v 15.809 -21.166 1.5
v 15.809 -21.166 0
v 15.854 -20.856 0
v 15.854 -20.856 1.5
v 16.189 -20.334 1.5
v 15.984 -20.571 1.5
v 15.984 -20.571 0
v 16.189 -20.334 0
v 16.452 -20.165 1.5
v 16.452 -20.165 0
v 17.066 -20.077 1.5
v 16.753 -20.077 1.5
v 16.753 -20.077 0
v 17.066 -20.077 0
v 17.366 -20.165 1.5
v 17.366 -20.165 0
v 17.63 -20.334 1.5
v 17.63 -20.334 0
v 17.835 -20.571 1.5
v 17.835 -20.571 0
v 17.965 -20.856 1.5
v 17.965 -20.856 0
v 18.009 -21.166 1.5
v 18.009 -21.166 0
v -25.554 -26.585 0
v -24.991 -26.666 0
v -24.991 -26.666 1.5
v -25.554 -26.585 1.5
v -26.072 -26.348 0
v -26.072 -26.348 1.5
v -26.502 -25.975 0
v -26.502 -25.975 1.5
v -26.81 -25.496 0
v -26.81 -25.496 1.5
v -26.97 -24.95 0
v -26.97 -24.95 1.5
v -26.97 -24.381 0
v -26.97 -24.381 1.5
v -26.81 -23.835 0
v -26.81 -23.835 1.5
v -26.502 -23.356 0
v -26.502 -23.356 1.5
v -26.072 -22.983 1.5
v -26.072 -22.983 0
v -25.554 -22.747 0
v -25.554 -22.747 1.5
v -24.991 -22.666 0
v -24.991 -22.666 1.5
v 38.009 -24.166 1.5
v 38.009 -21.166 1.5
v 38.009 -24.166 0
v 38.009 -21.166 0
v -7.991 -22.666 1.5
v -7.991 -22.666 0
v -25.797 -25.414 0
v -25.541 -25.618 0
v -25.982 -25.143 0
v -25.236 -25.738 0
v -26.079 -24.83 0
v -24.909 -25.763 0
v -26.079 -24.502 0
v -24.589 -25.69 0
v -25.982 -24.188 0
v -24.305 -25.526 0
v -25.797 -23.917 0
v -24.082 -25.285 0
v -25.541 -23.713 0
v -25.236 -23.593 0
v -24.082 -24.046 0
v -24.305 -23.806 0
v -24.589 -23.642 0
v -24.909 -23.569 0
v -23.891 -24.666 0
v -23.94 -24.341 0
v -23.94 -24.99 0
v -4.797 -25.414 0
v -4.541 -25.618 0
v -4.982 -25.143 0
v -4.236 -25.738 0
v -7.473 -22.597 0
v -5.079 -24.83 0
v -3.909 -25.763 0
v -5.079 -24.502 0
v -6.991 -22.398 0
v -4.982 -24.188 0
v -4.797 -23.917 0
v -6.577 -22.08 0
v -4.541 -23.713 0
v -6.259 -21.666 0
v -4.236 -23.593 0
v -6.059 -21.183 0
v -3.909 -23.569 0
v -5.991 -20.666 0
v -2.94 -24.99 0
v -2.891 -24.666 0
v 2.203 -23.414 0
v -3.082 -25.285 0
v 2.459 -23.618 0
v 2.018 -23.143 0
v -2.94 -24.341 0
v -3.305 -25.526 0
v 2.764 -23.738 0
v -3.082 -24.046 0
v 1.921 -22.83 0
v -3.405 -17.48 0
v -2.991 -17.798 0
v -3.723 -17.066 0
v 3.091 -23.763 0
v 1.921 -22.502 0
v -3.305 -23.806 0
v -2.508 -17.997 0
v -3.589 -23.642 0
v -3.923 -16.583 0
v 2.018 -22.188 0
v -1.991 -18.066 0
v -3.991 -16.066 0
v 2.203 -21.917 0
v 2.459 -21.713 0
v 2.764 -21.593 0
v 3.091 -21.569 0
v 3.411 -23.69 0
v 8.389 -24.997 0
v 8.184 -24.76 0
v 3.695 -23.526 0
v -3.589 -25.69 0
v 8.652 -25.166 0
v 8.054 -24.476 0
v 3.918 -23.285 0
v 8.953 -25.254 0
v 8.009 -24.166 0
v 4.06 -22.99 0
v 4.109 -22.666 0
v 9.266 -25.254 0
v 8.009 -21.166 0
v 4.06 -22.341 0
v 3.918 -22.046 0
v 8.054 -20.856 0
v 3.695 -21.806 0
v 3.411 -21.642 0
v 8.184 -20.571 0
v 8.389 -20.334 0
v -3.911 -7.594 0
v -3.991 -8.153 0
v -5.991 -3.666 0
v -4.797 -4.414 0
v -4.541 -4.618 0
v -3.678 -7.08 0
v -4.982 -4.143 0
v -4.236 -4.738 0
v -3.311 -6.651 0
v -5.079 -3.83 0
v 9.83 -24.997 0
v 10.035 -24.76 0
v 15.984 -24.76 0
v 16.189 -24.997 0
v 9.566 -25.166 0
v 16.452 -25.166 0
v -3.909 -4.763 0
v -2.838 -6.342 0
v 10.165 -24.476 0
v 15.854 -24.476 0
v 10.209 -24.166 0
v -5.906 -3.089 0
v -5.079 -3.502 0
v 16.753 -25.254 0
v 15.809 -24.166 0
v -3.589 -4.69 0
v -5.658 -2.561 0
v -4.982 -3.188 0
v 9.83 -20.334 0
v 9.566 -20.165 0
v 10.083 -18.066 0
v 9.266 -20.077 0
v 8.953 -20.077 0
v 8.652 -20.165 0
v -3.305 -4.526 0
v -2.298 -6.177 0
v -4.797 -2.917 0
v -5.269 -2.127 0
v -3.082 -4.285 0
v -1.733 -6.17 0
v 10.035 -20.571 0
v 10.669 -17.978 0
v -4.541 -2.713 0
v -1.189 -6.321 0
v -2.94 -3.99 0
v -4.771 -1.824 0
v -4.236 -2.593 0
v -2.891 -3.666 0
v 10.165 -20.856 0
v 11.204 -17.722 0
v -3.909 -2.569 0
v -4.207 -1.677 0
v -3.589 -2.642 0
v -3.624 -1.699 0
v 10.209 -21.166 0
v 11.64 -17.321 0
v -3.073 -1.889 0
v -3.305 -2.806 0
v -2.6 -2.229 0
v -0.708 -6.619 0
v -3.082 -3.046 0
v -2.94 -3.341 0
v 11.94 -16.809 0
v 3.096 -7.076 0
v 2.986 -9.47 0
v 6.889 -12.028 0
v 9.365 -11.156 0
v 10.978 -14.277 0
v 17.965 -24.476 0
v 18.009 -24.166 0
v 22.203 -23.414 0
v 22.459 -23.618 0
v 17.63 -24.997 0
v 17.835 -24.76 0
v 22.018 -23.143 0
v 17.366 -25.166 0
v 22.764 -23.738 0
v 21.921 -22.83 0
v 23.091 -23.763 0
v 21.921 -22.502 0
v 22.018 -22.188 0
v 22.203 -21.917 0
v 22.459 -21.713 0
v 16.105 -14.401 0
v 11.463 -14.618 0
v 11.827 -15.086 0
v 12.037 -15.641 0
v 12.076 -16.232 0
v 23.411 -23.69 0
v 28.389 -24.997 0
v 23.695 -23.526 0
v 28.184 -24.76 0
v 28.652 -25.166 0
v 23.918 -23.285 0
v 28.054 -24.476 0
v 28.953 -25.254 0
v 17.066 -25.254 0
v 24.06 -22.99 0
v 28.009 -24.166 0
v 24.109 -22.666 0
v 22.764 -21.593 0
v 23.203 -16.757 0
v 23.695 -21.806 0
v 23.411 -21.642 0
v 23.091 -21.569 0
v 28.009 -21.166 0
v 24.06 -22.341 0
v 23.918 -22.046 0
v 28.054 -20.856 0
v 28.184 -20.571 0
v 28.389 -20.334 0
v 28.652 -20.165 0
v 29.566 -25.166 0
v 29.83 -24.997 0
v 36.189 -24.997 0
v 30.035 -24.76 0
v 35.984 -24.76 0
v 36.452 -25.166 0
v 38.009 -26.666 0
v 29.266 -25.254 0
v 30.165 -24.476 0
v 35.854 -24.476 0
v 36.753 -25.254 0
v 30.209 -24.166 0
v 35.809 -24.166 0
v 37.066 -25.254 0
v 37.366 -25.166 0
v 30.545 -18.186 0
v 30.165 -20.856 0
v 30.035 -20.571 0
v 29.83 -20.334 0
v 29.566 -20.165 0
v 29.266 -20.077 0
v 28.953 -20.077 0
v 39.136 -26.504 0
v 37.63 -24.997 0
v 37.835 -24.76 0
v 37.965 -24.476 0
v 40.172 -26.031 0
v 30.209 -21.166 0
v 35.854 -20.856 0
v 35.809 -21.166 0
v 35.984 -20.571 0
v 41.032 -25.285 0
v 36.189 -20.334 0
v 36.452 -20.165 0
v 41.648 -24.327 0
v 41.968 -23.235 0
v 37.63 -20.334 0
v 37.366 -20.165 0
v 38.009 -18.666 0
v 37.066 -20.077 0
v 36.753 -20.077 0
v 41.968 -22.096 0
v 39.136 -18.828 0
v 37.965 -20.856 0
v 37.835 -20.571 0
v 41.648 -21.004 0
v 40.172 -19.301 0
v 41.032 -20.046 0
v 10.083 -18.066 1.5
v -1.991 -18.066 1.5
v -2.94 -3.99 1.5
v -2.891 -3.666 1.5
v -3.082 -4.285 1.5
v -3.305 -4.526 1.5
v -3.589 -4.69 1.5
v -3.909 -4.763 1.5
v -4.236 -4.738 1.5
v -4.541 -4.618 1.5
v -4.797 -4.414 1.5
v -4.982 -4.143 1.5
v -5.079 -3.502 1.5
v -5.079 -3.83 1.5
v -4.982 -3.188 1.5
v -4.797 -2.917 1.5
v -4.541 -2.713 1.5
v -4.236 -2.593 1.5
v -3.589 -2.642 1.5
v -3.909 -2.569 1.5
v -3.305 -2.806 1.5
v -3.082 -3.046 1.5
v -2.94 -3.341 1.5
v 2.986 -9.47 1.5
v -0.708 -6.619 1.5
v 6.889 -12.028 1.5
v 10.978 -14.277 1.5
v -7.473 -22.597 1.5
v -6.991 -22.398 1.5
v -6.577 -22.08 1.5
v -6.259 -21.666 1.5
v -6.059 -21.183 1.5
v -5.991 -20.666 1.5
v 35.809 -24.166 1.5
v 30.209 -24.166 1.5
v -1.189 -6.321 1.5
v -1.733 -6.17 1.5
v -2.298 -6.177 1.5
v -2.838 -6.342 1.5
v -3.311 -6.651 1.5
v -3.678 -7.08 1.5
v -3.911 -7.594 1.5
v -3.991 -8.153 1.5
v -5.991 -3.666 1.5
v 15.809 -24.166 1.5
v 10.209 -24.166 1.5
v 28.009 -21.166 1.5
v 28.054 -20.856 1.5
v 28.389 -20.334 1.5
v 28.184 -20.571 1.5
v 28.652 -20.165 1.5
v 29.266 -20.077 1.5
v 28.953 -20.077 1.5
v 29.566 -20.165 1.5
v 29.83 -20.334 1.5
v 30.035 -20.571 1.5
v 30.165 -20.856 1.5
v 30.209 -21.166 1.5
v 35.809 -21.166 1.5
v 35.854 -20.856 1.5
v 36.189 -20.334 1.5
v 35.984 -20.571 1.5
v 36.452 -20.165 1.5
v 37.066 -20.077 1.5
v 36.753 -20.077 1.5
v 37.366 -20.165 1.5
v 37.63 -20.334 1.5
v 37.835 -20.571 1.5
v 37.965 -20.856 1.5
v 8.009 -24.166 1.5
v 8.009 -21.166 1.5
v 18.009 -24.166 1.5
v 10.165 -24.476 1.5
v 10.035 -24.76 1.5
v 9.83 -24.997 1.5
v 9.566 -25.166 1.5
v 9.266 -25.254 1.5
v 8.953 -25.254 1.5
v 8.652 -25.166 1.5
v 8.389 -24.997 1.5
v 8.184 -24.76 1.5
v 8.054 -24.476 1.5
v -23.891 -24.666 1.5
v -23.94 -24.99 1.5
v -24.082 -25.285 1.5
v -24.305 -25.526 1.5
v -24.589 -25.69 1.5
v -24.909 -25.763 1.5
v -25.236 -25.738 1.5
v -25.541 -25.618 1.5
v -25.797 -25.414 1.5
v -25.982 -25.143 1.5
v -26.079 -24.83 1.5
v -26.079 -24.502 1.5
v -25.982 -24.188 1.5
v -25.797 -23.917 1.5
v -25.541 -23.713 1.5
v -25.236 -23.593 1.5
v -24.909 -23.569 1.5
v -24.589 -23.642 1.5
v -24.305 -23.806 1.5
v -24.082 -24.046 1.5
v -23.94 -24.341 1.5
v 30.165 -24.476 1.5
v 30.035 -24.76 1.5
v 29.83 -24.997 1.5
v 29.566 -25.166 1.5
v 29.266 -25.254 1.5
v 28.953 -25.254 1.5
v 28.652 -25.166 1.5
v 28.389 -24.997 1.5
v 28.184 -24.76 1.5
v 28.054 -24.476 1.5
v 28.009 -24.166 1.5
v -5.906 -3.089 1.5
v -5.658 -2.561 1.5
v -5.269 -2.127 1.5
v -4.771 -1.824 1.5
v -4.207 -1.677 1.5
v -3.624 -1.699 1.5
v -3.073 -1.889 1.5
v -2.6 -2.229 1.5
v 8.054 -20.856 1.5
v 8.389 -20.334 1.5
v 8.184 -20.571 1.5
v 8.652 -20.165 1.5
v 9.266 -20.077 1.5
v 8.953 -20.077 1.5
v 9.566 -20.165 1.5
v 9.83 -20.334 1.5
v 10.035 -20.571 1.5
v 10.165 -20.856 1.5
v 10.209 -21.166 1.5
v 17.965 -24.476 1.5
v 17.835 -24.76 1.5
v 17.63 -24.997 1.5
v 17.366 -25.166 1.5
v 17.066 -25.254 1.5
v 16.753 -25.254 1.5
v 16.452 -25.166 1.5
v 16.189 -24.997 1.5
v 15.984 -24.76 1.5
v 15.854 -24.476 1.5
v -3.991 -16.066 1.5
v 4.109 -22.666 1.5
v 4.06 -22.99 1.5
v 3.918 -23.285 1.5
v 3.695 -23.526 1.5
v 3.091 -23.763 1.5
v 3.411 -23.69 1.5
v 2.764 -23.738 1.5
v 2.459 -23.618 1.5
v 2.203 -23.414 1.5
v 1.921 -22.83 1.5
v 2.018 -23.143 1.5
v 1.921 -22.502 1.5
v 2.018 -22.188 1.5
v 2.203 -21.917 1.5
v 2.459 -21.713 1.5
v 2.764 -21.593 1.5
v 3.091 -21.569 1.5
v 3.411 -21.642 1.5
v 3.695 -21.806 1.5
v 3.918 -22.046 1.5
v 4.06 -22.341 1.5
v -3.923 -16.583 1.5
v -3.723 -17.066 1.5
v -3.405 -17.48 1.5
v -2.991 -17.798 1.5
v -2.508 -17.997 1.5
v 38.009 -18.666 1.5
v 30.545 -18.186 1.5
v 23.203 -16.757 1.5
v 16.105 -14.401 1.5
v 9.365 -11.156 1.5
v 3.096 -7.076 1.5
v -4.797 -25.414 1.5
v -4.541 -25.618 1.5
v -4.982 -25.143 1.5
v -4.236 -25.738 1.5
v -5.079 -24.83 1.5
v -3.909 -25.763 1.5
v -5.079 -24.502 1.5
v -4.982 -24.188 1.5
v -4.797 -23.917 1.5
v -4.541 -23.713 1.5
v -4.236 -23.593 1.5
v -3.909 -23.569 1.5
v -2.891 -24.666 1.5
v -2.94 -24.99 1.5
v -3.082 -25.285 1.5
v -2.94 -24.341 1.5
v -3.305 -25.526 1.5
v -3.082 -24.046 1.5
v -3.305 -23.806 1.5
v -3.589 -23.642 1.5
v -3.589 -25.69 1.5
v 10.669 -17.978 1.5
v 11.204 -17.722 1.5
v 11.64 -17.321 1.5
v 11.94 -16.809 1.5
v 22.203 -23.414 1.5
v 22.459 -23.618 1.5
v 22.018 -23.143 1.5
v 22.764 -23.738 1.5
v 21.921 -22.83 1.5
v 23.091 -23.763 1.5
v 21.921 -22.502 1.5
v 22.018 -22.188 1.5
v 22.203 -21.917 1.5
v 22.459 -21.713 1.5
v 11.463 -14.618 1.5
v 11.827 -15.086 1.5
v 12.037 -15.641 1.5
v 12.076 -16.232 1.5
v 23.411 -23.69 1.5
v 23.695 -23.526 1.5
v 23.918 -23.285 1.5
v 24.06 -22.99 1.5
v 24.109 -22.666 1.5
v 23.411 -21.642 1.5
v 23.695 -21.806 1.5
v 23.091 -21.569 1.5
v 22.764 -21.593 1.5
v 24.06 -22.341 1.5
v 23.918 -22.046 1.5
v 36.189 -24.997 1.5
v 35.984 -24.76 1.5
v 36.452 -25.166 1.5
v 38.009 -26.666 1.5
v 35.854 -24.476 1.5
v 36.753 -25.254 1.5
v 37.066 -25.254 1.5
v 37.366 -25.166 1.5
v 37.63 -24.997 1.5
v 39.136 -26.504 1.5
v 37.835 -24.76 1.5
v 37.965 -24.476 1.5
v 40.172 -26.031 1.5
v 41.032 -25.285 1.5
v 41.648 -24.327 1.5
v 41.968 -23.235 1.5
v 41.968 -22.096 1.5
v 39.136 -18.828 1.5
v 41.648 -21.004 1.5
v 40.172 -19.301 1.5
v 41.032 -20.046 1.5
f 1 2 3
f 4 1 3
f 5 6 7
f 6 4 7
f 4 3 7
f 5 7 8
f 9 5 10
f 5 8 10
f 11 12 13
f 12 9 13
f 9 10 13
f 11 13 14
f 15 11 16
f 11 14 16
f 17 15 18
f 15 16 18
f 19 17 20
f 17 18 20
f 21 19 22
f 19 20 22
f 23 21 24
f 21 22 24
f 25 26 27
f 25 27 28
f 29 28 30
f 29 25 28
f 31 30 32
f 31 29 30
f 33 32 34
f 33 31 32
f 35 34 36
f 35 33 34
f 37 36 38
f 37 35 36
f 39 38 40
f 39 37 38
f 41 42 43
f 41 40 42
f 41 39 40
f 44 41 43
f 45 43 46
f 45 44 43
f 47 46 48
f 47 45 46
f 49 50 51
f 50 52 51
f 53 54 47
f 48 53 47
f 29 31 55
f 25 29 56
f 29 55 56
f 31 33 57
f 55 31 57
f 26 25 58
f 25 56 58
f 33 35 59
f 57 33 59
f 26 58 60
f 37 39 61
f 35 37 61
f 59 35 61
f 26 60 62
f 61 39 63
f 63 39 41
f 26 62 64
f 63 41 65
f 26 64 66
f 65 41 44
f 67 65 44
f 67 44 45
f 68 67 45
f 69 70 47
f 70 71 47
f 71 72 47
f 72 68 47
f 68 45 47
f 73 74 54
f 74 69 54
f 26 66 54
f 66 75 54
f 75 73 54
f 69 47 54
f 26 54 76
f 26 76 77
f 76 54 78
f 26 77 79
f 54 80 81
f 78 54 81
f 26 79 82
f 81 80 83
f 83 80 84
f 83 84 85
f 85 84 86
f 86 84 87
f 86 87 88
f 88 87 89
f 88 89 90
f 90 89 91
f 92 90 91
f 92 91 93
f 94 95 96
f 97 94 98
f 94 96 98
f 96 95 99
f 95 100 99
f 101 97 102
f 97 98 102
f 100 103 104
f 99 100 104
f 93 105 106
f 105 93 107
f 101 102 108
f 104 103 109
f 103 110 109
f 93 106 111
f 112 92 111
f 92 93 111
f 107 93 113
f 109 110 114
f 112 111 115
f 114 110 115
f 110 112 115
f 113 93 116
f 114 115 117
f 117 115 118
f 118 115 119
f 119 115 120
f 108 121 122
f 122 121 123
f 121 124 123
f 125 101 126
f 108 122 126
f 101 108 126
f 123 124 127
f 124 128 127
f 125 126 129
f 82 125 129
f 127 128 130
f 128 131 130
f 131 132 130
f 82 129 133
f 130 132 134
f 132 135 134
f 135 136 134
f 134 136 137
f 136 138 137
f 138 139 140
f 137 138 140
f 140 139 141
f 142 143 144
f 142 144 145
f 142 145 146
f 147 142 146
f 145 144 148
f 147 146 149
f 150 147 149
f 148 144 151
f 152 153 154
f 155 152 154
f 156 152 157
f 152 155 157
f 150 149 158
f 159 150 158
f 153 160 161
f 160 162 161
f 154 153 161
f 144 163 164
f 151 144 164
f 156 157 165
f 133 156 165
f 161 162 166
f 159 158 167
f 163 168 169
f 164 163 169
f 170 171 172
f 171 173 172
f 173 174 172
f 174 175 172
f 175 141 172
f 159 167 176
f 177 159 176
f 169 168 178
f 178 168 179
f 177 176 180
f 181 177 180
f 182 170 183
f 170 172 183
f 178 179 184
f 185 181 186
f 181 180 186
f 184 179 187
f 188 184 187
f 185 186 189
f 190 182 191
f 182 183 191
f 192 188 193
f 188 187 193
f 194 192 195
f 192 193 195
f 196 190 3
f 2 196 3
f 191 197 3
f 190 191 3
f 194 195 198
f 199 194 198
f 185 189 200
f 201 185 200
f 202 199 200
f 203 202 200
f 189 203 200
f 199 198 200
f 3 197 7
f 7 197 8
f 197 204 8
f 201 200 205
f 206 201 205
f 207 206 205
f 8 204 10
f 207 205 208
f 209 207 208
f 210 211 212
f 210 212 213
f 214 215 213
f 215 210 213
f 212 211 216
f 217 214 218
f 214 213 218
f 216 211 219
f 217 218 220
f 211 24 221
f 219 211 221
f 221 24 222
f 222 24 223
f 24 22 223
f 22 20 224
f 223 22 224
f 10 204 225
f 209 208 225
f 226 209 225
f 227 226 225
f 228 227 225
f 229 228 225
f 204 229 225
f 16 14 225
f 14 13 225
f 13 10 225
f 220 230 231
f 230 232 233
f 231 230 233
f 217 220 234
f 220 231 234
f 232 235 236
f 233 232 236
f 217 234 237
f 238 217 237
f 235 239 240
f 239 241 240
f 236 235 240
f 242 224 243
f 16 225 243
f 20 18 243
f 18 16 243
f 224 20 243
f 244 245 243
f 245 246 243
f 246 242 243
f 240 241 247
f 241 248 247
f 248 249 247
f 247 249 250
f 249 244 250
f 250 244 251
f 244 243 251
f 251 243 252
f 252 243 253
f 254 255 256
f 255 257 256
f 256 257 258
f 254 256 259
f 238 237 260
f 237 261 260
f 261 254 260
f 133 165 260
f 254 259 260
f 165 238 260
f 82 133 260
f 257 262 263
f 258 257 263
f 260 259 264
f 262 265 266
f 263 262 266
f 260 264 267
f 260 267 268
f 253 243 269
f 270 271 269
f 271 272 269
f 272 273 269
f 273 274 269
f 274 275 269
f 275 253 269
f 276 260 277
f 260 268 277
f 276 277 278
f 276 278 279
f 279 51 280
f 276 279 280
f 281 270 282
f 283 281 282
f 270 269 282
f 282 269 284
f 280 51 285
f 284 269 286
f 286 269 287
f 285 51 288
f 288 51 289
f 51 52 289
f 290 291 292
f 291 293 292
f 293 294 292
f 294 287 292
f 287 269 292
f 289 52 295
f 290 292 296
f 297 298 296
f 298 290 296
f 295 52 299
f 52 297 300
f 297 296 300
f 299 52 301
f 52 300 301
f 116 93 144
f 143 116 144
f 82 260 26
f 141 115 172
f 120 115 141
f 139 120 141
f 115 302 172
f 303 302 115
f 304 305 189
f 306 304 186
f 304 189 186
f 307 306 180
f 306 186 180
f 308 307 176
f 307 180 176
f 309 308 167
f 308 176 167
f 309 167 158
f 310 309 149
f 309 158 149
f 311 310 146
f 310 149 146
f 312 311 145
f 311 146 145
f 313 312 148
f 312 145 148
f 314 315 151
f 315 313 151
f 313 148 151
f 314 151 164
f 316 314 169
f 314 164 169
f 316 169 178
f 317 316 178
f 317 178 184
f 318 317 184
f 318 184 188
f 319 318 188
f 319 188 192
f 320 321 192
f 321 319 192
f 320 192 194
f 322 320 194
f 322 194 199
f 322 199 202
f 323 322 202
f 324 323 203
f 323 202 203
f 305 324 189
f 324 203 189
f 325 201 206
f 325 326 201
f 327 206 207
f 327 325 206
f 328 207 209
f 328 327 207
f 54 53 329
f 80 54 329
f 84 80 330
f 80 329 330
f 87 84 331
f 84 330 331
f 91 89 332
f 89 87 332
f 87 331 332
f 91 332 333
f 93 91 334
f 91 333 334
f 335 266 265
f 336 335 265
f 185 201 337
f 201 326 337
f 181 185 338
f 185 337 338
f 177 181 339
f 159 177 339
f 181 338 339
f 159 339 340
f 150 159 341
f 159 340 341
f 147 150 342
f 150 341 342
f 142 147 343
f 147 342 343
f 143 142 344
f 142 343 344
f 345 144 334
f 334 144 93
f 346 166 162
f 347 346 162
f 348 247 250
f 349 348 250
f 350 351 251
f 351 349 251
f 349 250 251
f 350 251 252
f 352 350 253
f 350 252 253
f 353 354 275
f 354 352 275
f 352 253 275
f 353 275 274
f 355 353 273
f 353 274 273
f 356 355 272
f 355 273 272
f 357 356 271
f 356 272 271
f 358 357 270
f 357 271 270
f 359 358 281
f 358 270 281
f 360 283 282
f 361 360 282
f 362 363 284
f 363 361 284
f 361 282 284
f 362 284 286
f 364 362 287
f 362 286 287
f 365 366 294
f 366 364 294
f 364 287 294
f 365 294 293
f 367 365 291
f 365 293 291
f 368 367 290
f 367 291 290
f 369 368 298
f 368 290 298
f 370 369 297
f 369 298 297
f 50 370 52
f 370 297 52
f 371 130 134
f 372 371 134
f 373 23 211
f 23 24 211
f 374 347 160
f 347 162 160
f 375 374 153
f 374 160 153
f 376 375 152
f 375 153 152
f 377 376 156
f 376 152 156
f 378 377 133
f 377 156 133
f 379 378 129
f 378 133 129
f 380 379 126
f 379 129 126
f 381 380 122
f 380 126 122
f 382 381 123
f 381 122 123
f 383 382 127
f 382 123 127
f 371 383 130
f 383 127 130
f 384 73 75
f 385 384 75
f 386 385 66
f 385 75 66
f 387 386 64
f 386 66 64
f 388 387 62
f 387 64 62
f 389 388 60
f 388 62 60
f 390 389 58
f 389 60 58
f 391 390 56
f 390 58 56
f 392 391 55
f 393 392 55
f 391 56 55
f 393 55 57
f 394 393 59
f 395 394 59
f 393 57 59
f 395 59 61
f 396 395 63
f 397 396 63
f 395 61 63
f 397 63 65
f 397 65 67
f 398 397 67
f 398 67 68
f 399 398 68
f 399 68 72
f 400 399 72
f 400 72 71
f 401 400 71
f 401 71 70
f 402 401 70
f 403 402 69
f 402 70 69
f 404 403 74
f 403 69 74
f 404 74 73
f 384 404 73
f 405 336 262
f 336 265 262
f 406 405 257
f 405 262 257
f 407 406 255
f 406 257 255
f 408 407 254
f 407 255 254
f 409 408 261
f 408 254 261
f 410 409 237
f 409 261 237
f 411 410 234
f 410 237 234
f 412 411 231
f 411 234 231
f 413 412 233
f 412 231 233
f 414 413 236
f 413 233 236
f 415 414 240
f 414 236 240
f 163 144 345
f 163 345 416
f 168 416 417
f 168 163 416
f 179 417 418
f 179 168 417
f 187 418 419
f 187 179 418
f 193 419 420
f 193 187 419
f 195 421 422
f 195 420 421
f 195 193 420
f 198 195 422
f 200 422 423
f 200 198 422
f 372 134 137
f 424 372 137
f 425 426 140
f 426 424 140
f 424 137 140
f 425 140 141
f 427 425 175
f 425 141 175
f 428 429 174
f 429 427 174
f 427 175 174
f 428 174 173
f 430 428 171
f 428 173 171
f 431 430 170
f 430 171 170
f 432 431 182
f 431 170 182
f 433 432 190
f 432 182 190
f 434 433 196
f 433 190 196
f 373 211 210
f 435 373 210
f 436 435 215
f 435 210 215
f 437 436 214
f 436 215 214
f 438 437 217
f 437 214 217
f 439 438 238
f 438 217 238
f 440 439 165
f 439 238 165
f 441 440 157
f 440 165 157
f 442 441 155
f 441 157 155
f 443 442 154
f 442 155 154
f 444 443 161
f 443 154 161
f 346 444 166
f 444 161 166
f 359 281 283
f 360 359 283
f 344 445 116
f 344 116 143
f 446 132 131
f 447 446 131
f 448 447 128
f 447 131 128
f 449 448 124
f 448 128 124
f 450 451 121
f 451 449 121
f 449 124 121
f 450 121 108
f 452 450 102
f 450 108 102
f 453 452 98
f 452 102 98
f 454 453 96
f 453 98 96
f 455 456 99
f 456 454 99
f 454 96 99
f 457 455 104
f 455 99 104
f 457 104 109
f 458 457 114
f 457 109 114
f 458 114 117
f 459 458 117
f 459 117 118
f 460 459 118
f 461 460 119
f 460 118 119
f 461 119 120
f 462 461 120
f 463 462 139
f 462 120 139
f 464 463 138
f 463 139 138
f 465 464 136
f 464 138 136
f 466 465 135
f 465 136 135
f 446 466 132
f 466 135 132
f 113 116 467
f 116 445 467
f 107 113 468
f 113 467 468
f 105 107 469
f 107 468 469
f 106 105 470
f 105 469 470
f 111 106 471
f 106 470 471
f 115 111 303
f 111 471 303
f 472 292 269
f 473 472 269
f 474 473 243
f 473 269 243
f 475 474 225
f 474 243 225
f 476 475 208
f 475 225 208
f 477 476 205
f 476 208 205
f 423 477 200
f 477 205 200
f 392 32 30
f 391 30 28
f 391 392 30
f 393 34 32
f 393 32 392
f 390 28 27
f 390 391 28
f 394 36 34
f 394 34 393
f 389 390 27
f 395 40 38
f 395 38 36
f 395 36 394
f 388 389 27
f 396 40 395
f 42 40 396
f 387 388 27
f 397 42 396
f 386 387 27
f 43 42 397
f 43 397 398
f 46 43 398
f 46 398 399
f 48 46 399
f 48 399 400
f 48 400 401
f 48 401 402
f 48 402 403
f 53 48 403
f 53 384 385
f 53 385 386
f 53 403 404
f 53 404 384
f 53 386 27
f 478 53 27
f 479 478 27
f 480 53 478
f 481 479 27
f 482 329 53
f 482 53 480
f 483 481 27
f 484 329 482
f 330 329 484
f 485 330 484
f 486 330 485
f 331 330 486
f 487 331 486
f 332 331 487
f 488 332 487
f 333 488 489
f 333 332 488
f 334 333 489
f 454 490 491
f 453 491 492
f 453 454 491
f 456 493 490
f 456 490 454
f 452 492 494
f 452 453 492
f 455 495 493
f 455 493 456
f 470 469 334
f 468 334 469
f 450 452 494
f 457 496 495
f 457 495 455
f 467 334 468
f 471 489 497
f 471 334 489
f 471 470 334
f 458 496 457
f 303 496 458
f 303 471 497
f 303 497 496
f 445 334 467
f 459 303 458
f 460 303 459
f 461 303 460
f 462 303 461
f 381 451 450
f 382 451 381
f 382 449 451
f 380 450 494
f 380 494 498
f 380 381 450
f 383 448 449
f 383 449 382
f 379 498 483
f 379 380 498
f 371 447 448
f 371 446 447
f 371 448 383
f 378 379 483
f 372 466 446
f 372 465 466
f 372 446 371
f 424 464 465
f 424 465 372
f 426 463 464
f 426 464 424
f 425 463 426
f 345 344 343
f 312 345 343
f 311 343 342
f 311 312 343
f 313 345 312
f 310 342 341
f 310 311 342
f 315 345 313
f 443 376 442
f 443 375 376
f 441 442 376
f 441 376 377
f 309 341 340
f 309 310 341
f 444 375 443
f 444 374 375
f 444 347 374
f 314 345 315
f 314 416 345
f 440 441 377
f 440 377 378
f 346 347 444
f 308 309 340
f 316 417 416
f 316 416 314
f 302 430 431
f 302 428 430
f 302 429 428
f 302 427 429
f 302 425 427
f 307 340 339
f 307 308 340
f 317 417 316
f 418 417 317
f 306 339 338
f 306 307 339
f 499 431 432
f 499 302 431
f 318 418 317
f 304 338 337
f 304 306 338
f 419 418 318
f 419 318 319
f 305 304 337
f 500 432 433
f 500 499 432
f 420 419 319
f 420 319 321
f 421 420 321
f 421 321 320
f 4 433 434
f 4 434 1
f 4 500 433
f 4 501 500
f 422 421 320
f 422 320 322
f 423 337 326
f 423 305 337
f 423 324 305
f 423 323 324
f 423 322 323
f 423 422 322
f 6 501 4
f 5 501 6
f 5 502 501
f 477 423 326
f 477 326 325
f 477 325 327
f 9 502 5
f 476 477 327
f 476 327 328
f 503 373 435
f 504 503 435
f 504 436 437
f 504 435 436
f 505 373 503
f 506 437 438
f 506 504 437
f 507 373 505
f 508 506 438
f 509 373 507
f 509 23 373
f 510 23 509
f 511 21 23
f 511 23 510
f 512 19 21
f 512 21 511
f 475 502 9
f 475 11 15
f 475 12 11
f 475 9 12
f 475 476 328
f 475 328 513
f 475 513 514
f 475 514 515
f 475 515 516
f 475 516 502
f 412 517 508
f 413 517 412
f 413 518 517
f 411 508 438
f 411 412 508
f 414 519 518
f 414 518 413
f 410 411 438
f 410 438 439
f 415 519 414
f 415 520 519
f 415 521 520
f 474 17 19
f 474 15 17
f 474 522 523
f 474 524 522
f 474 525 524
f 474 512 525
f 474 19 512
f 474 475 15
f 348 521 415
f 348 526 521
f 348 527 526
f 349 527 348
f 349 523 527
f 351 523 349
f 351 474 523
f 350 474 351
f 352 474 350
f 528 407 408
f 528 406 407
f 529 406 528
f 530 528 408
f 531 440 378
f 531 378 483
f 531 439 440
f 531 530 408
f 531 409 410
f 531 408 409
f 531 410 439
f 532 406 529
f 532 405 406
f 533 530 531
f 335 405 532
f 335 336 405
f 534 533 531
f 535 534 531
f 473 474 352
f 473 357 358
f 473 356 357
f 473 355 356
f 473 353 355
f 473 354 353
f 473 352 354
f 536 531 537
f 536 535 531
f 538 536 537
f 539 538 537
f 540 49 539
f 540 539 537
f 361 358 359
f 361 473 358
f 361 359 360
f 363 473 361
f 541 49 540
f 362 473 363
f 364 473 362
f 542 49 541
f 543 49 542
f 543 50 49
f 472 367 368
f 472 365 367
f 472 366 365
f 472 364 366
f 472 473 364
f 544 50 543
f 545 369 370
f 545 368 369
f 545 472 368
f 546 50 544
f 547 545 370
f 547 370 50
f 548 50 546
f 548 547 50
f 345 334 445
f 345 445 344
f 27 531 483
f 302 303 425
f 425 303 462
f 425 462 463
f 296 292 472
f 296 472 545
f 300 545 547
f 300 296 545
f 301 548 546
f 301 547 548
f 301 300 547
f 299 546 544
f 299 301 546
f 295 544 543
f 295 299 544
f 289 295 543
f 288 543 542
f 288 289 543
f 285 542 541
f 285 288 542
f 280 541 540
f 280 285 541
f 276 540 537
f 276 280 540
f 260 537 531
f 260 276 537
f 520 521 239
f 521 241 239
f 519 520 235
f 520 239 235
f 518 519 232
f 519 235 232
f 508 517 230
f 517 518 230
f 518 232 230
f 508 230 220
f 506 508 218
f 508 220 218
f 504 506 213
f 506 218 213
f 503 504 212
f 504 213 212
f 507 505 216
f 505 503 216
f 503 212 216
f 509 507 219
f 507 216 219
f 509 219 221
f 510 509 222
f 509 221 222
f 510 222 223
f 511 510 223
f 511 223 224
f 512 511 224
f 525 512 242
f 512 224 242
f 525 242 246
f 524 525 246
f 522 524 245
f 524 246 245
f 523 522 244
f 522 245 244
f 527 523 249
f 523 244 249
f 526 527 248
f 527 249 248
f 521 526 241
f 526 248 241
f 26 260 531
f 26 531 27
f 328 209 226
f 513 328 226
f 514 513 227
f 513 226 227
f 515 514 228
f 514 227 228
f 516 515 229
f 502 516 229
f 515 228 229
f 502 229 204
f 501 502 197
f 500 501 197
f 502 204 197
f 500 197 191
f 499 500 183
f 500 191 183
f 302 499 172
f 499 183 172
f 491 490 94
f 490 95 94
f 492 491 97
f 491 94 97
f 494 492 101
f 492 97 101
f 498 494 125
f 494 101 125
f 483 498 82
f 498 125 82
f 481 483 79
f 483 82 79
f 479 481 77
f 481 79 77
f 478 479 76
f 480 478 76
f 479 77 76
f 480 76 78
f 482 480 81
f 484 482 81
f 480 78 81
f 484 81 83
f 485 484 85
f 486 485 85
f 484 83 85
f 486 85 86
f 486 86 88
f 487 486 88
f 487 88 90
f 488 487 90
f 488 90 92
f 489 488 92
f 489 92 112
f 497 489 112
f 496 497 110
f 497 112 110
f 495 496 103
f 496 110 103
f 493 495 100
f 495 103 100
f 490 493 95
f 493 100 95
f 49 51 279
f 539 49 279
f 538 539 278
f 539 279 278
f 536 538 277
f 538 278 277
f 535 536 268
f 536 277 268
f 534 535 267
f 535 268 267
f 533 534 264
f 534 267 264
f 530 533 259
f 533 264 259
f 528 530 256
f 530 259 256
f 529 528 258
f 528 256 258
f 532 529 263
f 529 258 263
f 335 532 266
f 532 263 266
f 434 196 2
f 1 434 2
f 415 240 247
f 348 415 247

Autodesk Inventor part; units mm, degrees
ref_plane "YZ Plane" through (0, 0, 0) normal (1, 0, 0) x (0, 1, 0)
ref_plane "XZ Plane" through (0, 0, 0) normal (0, 1, 0) x (-1, 0, 0)
ref_plane "XY Plane" through (0, 0, 0) normal (0, 0, 1) x (1, 0, 0)
sketch "スケッチ1" plane through (0, 0, 0) normal (0, 0, 1) x (1, 0, 0)
  circle A0 centre (-3.9908, -3.6656) radius 1 projected
  circle A1 centre (-24.9908, -24.6656) radius 1 projected
  line L0 (-3.9908, -3.6656) -> (-24.9908, -3.6656) construction
  line L1 (-24.9908, -3.6656) -> (-24.9908, -24.6656) construction
  line L2 (-24.9908, -24.6656) -> (-3.9908, -24.6656) construction
  line L3 (-3.9908, -24.6656) -> (-3.9908, -3.6656) construction
  circle A2 centre (-3.9908, -3.6656) radius 1.1
  circle A3 centre (-24.9908, -3.6656) radius 1.1
  circle A4 centre (-3.9908, -24.6656) radius 1.1
  circle A5 centre (-24.9908, -24.6656) radius 1.1
  circle A6 centre (-24.9908, -14.1656) radius 8 projected
  circle A7 centre (-24.9908, -24.6656) radius 2
  circle A8 centre (-3.9908, -24.6656) radius 2
  circle A9 centre (-24.9908, -3.6656) radius 2
  circle A10 centre (-3.9908, -3.6656) radius 2
  line L4 (-24.9908, -26.6656) -> (-1.9908, -26.6656)
  line L5 (-3.9908, -26.6656) -> (-3.9908, -22.6656)
  line L6 (-3.9908, -22.6656) -> (-24.9908, -22.6656)
  line L7 (-24.9908, -22.6656) -> (-24.9908, -26.6656)
  line L8 (-5.9908, -24.6656) -> (-1.9908, -24.6656)
  line L9 (-1.9908, -24.6656) -> (-1.9908, -3.6656)
  line L10 (-1.9908, -3.6656) -> (-5.9908, -3.6656)
  line L11 (-5.9908, -3.6656) -> (-5.9908, -24.6656)
  line L12 (18.0092, -24.1656) -> (8.0092, -24.1656)
  line L13 (8.0092, -24.1656) -> (8.0092, -21.1656)
  line L14 (8.0092, -21.1656) -> (18.0092, -21.1656)
  line L15 (18.0092, -21.1656) -> (18.0092, -24.1656)
  line L16 (38.0092, -24.1656) -> (28.0092, -24.1656)
  line L17 (28.0092, -24.1656) -> (28.0092, -21.1656)
  line L18 (28.0092, -21.1656) -> (38.0092, -21.1656)
  line L19 (38.0092, -21.1656) -> (38.0092, -24.1656)
  circle A11 centre (16.9092, -24.1656) radius 1.1
  line L20 (13.0092, -24.1656) -> (13.0092, -21.1656) construction
  line L21 (13.0092, -22.6656) -> (18.0092, -22.6656) construction
  line L22 (28.0092, -22.6656) -> (18.0092, -22.6656) construction
  line L23 (23.0092, -22.6656) -> (23.0092, -26.0364) construction
  circle A12 centre (9.1092, -24.1656) radius 1.1
  circle A13 centre (16.9092, -21.1656) radius 1.1
  circle A14 centre (9.1092, -21.1656) radius 1.1
  circle A15 centre (29.1092, -24.1656) radius 1.1
  circle A16 centre (36.9092, -24.1656) radius 1.1
  circle A17 centre (29.1092, -21.1656) radius 1.1
  circle A18 centre (36.9092, -21.1656) radius 1.1
  line L24 (42.0092, -26.6656) -> (-1.9908, -26.6656)
  line L25 (-1.9908, -26.6656) -> (-1.9908, -18.1656)
  line L26 (-1.9908, -18.1656) -> (42.0092, -18.1656)
  line L27 (42.0092, -18.1656) -> (42.0092, -26.6656)
  circle A19 centre (38.0092, -22.6656) radius 4
  arc A20 (-2.5997, -2.2287) -> (38.0092, -18.6656) centre (38.0092, 39.7168) ccw
  circle A21 centre (23.0092, -22.6656) radius 1.1
  circle A22 centre (3.0092, -22.6656) radius 1.1
  line L28 (38.0092, -18.6656) -> (-1.9908, -18.6656) construction
  point P0 (0, 0)
  point P1 (38.0092, -26.6656)
  point P2 (-5.9908, -22.6656)
  point P3 (15.8092, -24.1656)
  point P4 (10.2092, -24.1656)
  point P5 (10.2092, -21.1656)
  point P6 (15.8092, -21.1656)
  point P7 (35.8092, -21.1656)
  point P8 (35.8092, -24.1656)
  point P9 (30.2092, -24.1656)
  point P10 (30.2092, -21.1656)
  point P11 (30.3847, -18.1656)
  point P12 (42.0092, -22.6656)
  dimension "d11" = 4
  dimension "d24" = 2.2
  dimension "d0" = 21
  dimension "d1" = 21
  dimension "d2" = 2.2
  dimension "d5" = 21
  dimension "d8" = 21
  dimension "d14" = 21
  dimension "d17" = 21
  dimension "d20" = 10
  dimension "d21" = 3
  dimension "d22" = 10
  dimension "d23" = 3
  dimension "d25" = 2.5
  dimension "d26" = 3
  dimension "d28" = 10
  dimension "d29" = 10
  dimension "d31" = 2.2
extrude "押し出し1" add sketch "スケッチ1" along normal blind 1.5 contours L10 A10 A2 | A2 L10 A10 | L9 A8 L6 L11 A10 | A10 A20 L26 L9 | L26 A20 A19 L18 A17 L17 A15 L16 L24 L25 L9 | L11 A8 L4 A7 L6 | L6 A8 L11 | L8 A4 L5 A8 | L25 L4 A8 | A8 L5 A4 L8 | L5 A4 L8 A8 | L7 A5 A7 | A7 L7 A5 | L8 A4 L5 A8 | A19 L16 A16 L19 A18 L18 picked at (39.3425, -22.6656)
fillet "フィレット1" radius 2 1 edges at (-5.9908, -22.6656, 0.75)
sketch "スケッチ2" plane through (0, 0, 1.5) normal (0, 0, 1) x (1, 0, 0)
  line L0 (-24.9908, -26.6656) -> (38.0092, -26.6656) projected
  arc A0 (38.0092, -26.6656) -> (38.0092, -18.6656) centre (38.0092, -22.6656) ccw projected
  arc A1 (-2.5997, -2.2287) -> (38.0092, -18.6656) centre (38.0092, 39.7168) ccw projected
  arc A2 (-2.5997, -2.2287) -> (-5.9908, -3.6656) centre (-3.9908, -3.6656) ccw projected
  line L1 (-5.9908, -3.6656) -> (-5.9908, -20.6656) projected
  arc A3 (-7.9908, -22.6656) -> (-5.9908, -20.6656) centre (-7.9908, -20.6656) ccw projected
  line L2 (-7.9908, -22.6656) -> (-24.9908, -22.6656) projected
  arc A4 (-24.9908, -22.6656) -> (-24.9908, -26.6656) centre (-24.9908, -24.6656) ccw projected
  circle A5 centre (-24.9908, -24.6656) radius 1.1 projected
  circle A6 centre (-3.9908, -3.6656) radius 1.1 projected
  circle A7 centre (-3.9908, -24.6656) radius 1.1 projected
  line L3 (18.0092, -21.1656) -> (18.0092, -24.1656) projected
  arc A8 (15.8092, -24.1656) -> (18.0092, -24.1656) centre (16.9092, -24.1656) ccw projected
  line L4 (15.8092, -24.1656) -> (10.2092, -24.1656) projected
  arc A9 (8.0092, -24.1656) -> (10.2092, -24.1656) centre (9.1092, -24.1656) ccw projected
  line L5 (8.0092, -24.1656) -> (8.0092, -21.1656) projected
  arc A10 (10.2092, -21.1656) -> (8.0092, -21.1656) centre (9.1092, -21.1656) ccw projected
  line L6 (10.2092, -21.1656) -> (15.8092, -21.1656) projected
  arc A11 (18.0092, -21.1656) -> (15.8092, -21.1656) centre (16.9092, -21.1656) ccw projected
  circle A12 centre (3.0092, -22.6656) radius 1.1 projected
  circle A13 centre (23.0092, -22.6656) radius 1.1 projected
  line L7 (30.2092, -21.1656) -> (35.8092, -21.1656) projected
  arc A14 (38.0092, -21.1656) -> (35.8092, -21.1656) centre (36.9092, -21.1656) ccw projected
  line L8 (38.0092, -21.1656) -> (38.0092, -24.1656) projected
  arc A15 (35.8092, -24.1656) -> (38.0092, -24.1656) centre (36.9092, -24.1656) ccw projected
  line L9 (35.8092, -24.1656) -> (30.2092, -24.1656) projected
  arc A16 (28.0092, -24.1656) -> (30.2092, -24.1656) centre (29.1092, -24.1656) ccw projected
  line L10 (28.0092, -24.1656) -> (28.0092, -21.1656) projected
  arc A17 (30.2092, -21.1656) -> (28.0092, -21.1656) centre (29.1092, -21.1656) ccw projected
  line L11 (38.0092, -24.6656) -> (-7.9908, -24.6656)
  arc A18 (-7.9908, -24.6656) -> (-3.9908, -20.6656) centre (-7.9908, -20.6656) ccw
  line L12 (-3.9908, -16.0656) -> (-3.9908, -8.1535)
  arc A19 (-0.7084, -6.6187) -> (38.0092, -20.6656) centre (38.0092, 39.7168) ccw
  arc A20 (38.0092, -24.6656) -> (38.0092, -20.6656) centre (38.0092, -22.6656) ccw
  arc A21 (-0.7084, -6.6187) -> (-3.9908, -8.1535) centre (-1.9908, -8.1535) ccw
  line L13 (20.4813, -18.0656) -> (-1.9908, -18.0656)
  arc A22 (-3.9908, -16.0656) -> (-1.9908, -18.0656) centre (-1.9908, -16.0656) ccw
  point P0 (0, 0)
  point P1 (-3.9908, -3.6656)
  point P2 (17.4157, -17.0454)
  point P3 (-3.9908, -15.0454)
  point P4 (9.1092, -20.0656)
  point P5 (9.2452, -18.0656)
  dimension "d35" = 2
  dimension "d36" = 2
  dimension "d40" = 2
  dimension "d41" = 2
extrude "押し出し2" cut sketch "スケッチ2" against normal blind 1.5 contours L13 A22 L12 A21 A19
fillet "フィレット2" [suppressed]
fillet "フィレット3" radius 2 1 edges at (20.4813, -18.0656, 0.75)
equation "\"d5\" = d0"
equation "\"d8\" = d1"
equation "\"d14\" = d0"
equation "\"d17\" = d8"
properties part number "3304_tesaki" material "アルミニウム 2014-T4"
